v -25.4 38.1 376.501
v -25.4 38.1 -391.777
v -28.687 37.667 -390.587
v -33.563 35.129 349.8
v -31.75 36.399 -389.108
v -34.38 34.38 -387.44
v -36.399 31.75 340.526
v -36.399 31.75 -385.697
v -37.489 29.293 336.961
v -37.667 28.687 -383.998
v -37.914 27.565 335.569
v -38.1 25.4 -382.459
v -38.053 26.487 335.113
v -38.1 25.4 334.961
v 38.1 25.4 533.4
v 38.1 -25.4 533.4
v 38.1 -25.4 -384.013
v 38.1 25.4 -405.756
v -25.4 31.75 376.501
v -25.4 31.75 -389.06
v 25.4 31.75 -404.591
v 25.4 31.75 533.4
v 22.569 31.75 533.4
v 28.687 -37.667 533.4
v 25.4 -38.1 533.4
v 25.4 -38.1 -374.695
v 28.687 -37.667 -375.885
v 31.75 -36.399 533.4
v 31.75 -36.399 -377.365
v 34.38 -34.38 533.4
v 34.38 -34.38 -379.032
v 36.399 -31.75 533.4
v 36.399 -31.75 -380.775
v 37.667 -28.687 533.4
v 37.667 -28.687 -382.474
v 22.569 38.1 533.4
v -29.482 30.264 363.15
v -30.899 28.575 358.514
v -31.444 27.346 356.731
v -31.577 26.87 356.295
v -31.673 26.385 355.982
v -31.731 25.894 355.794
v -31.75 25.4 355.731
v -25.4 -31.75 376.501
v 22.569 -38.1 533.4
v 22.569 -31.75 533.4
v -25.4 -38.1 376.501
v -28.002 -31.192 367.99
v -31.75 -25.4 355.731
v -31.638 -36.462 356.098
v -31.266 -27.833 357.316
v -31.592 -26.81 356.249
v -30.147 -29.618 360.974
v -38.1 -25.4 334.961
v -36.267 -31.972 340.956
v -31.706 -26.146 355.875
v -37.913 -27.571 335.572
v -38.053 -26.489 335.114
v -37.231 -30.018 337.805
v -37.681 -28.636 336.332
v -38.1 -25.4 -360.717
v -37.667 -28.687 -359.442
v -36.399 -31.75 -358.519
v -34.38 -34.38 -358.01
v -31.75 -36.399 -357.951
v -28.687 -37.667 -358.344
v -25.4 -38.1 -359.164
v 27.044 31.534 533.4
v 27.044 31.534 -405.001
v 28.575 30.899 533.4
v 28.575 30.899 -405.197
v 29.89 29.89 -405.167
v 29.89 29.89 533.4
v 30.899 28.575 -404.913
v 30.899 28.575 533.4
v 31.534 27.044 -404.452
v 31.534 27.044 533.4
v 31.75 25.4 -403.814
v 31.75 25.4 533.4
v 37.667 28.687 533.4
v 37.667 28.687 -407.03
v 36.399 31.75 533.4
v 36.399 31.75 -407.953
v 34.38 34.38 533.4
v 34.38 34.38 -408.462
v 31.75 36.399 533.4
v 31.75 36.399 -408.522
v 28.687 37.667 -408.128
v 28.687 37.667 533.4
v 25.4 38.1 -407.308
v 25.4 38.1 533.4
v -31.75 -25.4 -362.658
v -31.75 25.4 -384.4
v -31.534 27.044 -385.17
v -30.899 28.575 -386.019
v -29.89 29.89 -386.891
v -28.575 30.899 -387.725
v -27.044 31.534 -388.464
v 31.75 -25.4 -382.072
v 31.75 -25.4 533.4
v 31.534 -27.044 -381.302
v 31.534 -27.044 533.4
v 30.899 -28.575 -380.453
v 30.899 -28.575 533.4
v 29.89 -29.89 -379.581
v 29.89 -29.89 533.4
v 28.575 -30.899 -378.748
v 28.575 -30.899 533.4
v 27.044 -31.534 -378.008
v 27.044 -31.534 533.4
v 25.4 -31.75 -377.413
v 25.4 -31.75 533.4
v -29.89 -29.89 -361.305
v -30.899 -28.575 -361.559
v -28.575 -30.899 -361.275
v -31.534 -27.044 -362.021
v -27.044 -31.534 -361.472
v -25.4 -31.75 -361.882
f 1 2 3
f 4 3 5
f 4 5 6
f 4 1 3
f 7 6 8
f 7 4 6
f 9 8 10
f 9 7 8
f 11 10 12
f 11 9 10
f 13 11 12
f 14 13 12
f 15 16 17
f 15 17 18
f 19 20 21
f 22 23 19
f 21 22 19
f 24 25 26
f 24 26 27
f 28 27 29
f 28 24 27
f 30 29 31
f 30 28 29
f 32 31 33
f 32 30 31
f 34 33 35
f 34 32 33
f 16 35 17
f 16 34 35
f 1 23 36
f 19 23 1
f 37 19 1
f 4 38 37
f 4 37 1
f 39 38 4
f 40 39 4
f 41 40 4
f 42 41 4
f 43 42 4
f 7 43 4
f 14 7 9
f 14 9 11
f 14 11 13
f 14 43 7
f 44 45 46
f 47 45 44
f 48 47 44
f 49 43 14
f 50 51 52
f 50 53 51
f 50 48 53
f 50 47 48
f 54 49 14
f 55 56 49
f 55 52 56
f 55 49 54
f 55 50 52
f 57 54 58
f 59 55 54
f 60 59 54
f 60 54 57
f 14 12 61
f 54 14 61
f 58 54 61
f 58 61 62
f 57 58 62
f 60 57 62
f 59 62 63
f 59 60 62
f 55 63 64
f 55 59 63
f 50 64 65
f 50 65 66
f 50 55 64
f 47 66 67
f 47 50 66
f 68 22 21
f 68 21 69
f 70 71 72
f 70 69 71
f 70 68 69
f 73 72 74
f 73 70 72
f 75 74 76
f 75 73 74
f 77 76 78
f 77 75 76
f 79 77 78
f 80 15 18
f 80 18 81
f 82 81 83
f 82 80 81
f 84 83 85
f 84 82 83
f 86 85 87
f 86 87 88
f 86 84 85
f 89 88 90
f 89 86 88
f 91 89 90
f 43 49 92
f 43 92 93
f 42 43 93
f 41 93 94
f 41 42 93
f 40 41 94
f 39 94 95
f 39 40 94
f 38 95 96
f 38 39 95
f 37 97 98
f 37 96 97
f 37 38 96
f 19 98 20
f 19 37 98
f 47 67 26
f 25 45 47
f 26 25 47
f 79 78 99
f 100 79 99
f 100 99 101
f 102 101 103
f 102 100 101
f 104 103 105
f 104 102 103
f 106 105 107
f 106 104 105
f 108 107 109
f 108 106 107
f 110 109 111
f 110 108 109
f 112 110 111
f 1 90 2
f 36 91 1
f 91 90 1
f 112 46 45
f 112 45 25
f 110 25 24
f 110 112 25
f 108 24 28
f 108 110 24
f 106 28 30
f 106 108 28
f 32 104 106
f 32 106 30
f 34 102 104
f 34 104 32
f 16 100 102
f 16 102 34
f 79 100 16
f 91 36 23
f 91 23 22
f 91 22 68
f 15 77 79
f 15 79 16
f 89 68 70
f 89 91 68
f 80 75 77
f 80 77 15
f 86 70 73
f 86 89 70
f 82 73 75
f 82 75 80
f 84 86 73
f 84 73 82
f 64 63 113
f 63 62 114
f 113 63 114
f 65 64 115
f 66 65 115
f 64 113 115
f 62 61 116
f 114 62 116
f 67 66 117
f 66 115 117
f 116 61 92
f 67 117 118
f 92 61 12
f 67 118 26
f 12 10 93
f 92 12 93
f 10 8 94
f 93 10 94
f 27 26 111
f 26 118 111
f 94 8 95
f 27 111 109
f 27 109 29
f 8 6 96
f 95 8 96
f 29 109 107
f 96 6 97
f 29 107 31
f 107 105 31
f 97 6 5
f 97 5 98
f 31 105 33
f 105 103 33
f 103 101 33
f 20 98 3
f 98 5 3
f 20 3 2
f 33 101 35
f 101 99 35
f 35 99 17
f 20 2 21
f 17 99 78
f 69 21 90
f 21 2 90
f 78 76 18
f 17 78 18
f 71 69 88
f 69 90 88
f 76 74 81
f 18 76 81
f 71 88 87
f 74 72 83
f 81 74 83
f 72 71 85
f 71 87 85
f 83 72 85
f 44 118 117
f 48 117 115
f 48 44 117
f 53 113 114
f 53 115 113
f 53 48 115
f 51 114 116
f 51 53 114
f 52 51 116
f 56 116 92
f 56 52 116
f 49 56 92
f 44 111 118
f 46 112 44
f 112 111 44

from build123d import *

# Parameters (mm, degrees)
BOSS_EXTRUDE1_DEPTH     = 584.2
CUT_EXTRUDE1_DEPTH      = 1168.4
CUT_EXTRUDE1_DEPTH_BACK = 587.679520693
CUT_EXTRUDE2_DEPTH      = 587.679520693
CUT_EXTRUDE2_DEPTH_BACK = 587.679520693
CUT_EXTRUDE3_DEPTH      = 591.379276398


with BuildPart() as part:
    # Sketch1 → Boss-Extrude1 (new, symmetric)
    with BuildSketch(Plane.XY):
        with BuildLine():
            Line((-25.4, -38.1), (25.4, -38.1))
            ThreePointArc((25.4, -38.1), (34.380256121, -34.380256121), (38.1, -25.4))
            Line((38.1, -25.4), (38.1, 25.4))
            ThreePointArc((38.1, 25.4), (34.380256121, 34.380256121), (25.4, 38.1))
            Line((25.4, 38.1), (-25.4, 38.1))
            ThreePointArc((-25.4, 38.1), (-34.380256121, 34.380256121), (-38.1, 25.4))
            Line((-38.1, 25.4), (-38.1, -25.4))
            ThreePointArc((-38.1, -25.4), (-34.380256121, -34.380256121), (-25.4, -38.1))
        make_face()
        with BuildLine():
            Line((-25.4, 31.75), (25.4, 31.75))
            ThreePointArc((25.4, 31.75), (29.890128061, 29.890128061), (31.75, 25.4))
            Line((31.75, 25.4), (31.75, -25.4))
            ThreePointArc((31.75, -25.4), (29.890128061, -29.890128061), (25.4, -31.75))
            Line((25.4, -31.75), (-25.4, -31.75))
            ThreePointArc((-25.4, -31.75), (-29.890128061, -29.890128061), (-31.75, -25.4))
            Line((-31.75, -25.4), (-31.75, 25.4))
            ThreePointArc((-31.75, 25.4), (-29.890128061, 29.890128061), (-25.4, 31.75))
        make_face(mode=Mode.SUBTRACT)
    extrude(amount=BOSS_EXTRUDE1_DEPTH, both=True)

    # Sketch2 → Cut-Extrude1 (cut, two sides: drawn at the far end of the back side and taken through both)
    with BuildSketch(Plane(origin=(0, 0, 0), x_dir=(1, 0, 0), z_dir=(0, 1, 0)).offset(-CUT_EXTRUDE1_DEPTH_BACK)):
        Polygon((-38.1, -584.2), (38.1, -584.2), (-38.1, -334.961030472), align=None)
    extrude(amount=CUT_EXTRUDE1_DEPTH + CUT_EXTRUDE1_DEPTH_BACK, mode=Mode.SUBTRACT)

    # Sketch3 → Cut-Extrude2 (cut, two sides: drawn at the far end of the back side and taken through both)
    with BuildSketch(Plane(origin=(0, 0, 0), x_dir=(0, 0, -1), z_dir=(1, 0, 0)).offset(-CUT_EXTRUDE2_DEPTH_BACK)):
        Polygon((529.224802616, 234.912944521), (393.7, -38.1), (621.210787101, -151.037335513), (756.735589716, 121.975609008), align=None)
    extrude(amount=CUT_EXTRUDE2_DEPTH + CUT_EXTRUDE2_DEPTH_BACK, mode=Mode.SUBTRACT)

    # Sketch4 → Cut-Extrude3 (cut, through all)
    with BuildSketch(Plane(origin=(0, 38.1, 0), x_dir=(1, 0, 0), z_dir=(0, 1, 0))):
        Polygon((22.568881382, -533.4), (38.1, -533.4), (38.1, -584.2), align=None)
    extrude(amount=-CUT_EXTRUDE3_DEPTH, mode=Mode.SUBTRACT)

    # SurfaceCut1
    split(bisect_by=Plane(origin=(-91.776590451, -128.480237958, -300.187701194), x_dir=(0.9626963442251767, -0.1064681232735412, -0.24875748740910325), z_dir=(0.2705840882525802, 0.37879711890625634, 0.885040673581073)), keep=Keep.TOP)


solid = part.part
